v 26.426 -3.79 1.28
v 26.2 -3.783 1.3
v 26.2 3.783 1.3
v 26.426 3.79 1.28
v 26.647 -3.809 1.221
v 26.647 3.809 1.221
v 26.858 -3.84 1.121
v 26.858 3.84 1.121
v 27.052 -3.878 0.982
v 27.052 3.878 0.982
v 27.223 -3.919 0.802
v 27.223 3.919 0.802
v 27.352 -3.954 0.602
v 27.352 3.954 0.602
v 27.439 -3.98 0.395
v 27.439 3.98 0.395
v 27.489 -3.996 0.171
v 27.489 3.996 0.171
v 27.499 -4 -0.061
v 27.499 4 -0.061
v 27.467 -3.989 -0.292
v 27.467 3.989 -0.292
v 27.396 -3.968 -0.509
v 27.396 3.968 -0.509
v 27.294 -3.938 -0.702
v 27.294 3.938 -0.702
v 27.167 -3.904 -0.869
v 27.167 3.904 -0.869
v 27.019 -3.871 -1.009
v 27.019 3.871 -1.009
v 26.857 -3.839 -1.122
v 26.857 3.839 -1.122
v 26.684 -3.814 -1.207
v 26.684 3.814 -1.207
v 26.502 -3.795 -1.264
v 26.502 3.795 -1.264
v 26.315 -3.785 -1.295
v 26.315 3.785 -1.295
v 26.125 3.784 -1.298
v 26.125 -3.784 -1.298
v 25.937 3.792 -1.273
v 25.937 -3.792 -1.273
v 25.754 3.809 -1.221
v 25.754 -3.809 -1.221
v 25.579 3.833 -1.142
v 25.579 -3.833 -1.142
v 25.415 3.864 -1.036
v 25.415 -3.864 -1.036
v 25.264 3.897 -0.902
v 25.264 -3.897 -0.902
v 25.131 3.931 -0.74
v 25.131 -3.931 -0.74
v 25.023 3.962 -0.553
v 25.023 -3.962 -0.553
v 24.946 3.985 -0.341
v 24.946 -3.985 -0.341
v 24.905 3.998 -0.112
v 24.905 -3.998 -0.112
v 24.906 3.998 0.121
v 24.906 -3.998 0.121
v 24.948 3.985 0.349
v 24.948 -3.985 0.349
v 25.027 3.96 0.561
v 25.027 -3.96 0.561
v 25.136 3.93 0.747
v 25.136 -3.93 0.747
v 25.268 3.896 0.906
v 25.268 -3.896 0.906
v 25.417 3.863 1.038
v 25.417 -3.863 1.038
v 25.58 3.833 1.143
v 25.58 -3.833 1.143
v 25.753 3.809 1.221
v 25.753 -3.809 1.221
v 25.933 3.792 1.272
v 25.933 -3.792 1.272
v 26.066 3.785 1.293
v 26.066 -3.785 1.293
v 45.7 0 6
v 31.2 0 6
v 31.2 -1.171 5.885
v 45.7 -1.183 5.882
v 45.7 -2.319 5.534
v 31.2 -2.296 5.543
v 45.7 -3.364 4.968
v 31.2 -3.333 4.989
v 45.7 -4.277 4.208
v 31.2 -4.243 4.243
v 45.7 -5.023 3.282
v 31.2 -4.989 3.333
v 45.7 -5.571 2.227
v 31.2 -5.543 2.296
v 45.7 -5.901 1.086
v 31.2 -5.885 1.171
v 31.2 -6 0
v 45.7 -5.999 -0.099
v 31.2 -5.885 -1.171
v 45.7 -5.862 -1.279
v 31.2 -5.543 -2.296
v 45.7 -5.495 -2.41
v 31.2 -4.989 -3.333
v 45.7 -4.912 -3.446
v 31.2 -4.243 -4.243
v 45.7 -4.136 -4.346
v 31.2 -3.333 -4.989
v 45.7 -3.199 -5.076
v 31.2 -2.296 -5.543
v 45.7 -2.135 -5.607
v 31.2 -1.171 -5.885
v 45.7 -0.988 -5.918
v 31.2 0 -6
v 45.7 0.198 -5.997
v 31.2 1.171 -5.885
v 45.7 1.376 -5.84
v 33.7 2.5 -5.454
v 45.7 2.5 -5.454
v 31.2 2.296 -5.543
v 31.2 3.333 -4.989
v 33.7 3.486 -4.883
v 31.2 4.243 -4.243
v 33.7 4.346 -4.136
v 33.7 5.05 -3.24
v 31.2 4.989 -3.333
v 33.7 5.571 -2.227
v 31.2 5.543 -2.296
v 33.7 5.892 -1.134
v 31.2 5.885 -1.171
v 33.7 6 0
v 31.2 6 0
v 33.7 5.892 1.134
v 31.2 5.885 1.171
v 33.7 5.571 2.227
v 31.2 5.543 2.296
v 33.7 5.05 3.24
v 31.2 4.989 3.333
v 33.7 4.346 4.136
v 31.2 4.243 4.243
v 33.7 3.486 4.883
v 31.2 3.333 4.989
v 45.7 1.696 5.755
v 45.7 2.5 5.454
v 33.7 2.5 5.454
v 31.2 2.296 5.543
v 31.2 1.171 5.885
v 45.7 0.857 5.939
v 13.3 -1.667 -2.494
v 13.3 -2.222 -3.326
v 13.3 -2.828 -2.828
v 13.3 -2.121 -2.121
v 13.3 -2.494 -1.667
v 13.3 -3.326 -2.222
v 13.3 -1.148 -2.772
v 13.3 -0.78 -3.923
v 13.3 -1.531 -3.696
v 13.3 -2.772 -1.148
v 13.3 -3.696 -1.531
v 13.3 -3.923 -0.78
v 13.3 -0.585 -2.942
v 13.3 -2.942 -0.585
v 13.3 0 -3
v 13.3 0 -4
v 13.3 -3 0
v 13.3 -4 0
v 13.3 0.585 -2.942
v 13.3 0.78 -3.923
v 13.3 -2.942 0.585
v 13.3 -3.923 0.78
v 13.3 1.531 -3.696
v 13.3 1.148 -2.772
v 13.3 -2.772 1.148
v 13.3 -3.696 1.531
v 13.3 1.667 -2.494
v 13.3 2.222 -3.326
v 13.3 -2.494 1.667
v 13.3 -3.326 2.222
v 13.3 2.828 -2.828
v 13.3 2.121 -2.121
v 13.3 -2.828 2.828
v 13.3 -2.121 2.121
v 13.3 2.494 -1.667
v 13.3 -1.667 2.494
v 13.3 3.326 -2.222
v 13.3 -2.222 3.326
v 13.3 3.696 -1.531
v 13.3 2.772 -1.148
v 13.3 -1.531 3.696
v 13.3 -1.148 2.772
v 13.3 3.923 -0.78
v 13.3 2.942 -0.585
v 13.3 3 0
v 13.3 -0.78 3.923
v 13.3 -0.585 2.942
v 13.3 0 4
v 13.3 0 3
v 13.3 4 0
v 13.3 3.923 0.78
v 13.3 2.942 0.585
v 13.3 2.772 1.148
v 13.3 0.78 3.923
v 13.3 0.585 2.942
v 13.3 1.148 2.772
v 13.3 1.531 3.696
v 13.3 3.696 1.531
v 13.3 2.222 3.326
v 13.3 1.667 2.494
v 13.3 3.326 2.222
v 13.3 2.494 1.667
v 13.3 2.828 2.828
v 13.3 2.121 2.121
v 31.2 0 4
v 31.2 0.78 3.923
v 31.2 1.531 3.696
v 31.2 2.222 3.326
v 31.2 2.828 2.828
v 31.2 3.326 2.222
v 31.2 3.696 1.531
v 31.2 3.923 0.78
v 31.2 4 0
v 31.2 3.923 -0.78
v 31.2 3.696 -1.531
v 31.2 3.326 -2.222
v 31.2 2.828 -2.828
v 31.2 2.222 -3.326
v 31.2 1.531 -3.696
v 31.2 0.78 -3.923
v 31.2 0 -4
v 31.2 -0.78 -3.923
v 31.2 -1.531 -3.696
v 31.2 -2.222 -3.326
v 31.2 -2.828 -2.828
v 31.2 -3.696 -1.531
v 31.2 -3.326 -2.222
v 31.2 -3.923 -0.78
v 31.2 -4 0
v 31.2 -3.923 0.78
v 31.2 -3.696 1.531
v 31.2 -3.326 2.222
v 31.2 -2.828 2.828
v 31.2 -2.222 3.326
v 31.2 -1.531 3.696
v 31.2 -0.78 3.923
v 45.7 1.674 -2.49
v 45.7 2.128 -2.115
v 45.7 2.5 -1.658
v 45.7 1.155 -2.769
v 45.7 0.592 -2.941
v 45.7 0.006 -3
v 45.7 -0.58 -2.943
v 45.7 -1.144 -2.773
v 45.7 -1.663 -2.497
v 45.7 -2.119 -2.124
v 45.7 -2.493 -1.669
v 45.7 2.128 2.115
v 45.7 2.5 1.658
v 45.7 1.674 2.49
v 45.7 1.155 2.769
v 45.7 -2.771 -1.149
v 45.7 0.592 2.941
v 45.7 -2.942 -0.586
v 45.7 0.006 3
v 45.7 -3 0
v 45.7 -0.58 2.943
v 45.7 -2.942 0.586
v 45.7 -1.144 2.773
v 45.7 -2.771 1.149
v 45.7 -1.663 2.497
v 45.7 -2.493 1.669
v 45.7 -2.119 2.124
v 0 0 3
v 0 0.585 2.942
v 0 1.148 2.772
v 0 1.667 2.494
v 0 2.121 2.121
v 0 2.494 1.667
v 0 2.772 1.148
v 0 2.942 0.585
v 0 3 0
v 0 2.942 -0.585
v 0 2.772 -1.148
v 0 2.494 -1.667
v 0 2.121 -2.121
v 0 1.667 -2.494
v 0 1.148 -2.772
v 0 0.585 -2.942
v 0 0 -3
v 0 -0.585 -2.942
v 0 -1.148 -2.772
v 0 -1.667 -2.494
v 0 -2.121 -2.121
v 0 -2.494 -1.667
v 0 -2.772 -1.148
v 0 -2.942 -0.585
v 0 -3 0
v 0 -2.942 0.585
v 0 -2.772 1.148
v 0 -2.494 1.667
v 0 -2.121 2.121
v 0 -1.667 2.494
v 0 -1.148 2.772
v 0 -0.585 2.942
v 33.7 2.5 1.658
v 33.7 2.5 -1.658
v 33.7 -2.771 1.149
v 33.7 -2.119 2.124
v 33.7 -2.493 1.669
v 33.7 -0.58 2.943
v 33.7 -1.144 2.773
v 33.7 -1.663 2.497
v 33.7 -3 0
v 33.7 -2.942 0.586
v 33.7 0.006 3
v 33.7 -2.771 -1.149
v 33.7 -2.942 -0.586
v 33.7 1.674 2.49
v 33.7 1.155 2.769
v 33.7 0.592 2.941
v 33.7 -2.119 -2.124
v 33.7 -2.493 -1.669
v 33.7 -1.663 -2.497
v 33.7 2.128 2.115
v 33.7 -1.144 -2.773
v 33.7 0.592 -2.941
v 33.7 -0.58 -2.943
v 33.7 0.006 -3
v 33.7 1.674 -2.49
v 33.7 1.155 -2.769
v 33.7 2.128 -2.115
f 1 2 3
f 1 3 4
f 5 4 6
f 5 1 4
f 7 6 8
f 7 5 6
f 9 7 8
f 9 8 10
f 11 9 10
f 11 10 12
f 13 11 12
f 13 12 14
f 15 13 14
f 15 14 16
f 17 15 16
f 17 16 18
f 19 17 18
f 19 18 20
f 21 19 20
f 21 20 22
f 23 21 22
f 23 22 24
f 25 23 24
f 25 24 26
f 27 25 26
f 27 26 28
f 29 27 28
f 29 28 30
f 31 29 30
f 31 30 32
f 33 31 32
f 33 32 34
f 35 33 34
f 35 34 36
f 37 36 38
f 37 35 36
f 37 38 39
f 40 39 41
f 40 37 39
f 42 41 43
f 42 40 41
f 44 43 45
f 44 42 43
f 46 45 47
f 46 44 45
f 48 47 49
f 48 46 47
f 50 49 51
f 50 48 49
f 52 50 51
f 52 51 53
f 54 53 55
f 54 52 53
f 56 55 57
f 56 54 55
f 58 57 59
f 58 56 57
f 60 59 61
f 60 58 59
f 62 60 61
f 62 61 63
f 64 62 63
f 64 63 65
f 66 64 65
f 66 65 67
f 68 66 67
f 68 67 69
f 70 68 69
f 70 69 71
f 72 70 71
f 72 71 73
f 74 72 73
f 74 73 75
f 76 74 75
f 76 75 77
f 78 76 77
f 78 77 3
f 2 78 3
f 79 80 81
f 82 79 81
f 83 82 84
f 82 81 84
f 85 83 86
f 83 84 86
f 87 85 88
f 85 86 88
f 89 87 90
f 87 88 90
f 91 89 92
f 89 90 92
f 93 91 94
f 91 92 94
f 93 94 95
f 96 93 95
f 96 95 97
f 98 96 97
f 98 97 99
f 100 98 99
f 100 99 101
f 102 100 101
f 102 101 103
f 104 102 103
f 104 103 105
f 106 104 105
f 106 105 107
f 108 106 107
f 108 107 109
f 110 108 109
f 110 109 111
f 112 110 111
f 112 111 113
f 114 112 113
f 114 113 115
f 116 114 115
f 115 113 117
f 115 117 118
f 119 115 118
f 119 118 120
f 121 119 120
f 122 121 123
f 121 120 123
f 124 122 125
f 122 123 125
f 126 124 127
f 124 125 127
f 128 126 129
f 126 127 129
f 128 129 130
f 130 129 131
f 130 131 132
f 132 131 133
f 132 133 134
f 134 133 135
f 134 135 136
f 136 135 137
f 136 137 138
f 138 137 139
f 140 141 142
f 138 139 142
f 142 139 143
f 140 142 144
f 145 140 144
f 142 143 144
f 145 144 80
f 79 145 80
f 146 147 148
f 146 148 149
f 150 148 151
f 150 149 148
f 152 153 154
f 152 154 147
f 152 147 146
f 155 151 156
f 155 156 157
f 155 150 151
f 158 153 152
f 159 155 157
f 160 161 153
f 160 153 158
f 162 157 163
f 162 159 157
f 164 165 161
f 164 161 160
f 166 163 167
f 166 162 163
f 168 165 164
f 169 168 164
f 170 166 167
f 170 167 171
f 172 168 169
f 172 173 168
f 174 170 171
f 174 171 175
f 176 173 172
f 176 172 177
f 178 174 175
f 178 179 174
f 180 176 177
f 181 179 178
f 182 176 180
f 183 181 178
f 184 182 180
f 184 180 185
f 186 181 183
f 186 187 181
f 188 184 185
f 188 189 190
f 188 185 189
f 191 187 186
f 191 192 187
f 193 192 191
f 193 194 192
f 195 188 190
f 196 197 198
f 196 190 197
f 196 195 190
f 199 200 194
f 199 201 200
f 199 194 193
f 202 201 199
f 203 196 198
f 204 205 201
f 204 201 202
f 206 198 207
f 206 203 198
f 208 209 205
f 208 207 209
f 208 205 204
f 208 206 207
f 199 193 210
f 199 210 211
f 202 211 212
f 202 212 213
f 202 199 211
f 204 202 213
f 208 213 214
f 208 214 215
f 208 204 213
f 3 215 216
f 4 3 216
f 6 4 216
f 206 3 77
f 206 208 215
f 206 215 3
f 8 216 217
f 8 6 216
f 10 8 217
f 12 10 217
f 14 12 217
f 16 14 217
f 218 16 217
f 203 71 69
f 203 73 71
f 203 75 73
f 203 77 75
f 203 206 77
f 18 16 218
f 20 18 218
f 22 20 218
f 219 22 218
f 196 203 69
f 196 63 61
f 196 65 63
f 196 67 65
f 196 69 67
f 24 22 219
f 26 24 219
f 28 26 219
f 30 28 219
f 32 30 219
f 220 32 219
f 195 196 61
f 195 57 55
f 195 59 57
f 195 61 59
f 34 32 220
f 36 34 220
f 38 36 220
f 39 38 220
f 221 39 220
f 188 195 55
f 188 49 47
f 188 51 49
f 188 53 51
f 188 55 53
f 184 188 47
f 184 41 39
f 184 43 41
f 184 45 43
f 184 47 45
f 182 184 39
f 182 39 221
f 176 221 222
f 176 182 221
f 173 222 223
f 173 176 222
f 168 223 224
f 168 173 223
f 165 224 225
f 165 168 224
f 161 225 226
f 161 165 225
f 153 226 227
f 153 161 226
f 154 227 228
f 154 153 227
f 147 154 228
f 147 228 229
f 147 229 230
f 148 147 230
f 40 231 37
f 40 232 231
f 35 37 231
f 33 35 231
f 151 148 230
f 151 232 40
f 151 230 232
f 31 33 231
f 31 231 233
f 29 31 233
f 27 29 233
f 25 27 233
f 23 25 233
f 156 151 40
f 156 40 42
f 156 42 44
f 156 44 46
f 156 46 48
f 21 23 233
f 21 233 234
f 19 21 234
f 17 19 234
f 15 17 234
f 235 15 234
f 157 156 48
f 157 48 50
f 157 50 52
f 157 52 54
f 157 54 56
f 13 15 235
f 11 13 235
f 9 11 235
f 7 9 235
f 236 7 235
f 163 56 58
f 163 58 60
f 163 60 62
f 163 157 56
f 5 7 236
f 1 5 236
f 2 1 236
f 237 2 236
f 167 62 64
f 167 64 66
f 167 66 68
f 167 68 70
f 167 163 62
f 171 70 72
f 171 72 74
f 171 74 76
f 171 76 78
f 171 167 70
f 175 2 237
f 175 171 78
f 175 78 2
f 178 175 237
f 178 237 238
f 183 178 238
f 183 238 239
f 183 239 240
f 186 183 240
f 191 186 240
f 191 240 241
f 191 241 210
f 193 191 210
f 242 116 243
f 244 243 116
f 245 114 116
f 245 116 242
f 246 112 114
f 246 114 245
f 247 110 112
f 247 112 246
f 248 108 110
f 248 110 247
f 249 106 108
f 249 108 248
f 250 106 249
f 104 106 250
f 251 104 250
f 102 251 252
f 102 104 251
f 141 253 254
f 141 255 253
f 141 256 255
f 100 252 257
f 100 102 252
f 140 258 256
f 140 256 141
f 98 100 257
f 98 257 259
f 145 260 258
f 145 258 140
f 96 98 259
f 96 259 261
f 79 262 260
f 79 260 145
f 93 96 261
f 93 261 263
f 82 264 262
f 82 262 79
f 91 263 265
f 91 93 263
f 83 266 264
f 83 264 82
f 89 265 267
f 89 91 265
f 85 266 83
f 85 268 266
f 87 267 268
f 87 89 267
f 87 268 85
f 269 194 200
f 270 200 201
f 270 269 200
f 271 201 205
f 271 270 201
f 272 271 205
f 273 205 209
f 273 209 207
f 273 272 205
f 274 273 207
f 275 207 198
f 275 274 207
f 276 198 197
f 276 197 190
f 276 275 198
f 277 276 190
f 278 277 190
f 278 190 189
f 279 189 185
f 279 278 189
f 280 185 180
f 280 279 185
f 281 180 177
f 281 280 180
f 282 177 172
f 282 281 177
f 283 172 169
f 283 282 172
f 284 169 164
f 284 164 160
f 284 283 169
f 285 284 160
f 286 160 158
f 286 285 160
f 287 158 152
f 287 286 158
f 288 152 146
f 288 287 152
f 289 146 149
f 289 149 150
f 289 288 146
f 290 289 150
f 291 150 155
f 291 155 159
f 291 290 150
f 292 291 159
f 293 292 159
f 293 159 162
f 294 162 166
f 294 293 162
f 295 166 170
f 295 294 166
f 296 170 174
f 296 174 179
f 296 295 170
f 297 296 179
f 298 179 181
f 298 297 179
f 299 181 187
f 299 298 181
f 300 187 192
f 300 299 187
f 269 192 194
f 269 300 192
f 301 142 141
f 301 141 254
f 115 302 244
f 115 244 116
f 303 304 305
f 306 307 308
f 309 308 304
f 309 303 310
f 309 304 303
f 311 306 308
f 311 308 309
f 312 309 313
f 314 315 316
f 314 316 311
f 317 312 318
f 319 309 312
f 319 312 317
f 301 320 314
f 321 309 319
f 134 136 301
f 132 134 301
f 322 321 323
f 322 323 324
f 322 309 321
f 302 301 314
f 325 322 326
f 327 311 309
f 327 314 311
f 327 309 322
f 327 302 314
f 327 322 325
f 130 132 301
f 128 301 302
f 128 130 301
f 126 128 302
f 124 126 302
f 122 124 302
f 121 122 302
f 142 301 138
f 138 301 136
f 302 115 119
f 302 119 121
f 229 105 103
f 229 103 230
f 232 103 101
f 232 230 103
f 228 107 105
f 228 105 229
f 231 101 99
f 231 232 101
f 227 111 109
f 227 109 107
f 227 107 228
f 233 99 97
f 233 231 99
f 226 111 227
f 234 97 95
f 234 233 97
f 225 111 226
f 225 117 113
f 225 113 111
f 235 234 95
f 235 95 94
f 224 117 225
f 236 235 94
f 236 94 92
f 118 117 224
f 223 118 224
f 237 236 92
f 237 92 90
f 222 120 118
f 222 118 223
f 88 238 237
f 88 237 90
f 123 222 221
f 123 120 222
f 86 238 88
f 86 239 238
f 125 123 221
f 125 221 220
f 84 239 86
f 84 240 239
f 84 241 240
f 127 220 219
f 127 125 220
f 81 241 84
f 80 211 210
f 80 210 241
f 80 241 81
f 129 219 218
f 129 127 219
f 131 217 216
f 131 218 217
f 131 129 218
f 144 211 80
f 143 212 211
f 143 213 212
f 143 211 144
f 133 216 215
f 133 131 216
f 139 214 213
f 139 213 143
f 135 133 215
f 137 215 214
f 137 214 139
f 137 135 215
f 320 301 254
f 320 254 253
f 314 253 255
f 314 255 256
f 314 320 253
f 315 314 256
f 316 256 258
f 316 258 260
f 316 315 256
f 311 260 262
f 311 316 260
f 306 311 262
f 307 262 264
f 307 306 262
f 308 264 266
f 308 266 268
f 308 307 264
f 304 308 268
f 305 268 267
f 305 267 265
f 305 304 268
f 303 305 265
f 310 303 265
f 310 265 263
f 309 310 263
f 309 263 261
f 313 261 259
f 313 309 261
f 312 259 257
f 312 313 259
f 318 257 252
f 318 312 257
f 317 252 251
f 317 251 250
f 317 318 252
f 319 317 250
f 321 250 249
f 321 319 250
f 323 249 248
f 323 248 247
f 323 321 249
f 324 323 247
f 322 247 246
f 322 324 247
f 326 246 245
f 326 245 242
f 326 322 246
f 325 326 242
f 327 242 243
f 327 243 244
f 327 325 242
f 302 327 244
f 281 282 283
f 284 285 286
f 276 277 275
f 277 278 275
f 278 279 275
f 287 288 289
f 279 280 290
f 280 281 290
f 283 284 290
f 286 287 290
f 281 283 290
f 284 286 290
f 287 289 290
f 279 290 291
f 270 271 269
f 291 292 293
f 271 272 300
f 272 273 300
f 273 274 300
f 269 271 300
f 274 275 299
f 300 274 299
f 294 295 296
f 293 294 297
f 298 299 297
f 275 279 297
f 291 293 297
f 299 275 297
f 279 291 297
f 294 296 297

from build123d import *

# Parameters (mm, degrees)
SKETCH_1_R               = 6
EXTRUDE_1_DEPTH          = 45.7
CUT_EXTRUDE_START        = -12
CUT_EXTRUDE_1_DEPTH      = 12
SKETCH_3_OUTSIDE_W       = 23.75
SKETCH_3_OUTSIDE_H       = 23.75
SKETCH_3_OUTSIDE_R       = 4
CUT_EXTRUDE_2_DEPTH      = 31.2
SKETCH_4_OUTSIDE_W       = 23.75
SKETCH_4_OUTSIDE_H       = 23.75
SKETCH_4_OUTSIDE_R       = 3
CUT_EXTRUDE_3_DEPTH      = 13.3
CUT_EXTRUDE_4_DEPTH      = 47.481071416
CUT_EXTRUDE_4_DEPTH_BACK = 47.481071416
SKETCH_5_R               = 1.3


with BuildPart() as part:
    # ｽｹｯﾁ1 → ﾎﾞｽ - 押し出し1 (new body)
    with BuildSketch(Plane(origin=(0, 0, 0), x_dir=(0, 0, -1), z_dir=(1, 0, 0))):
        with Locations(Location((0, 0, 0), (0, 0, 180))):
            Circle(SKETCH_1_R)
    extrude(amount=EXTRUDE_1_DEPTH)

    # ｽｹｯﾁ2 → ｶｯﾄ - 押し出し1 (cut)
    with BuildSketch(Plane(origin=(45.7, 0, 0), x_dir=(0, 0, -1), z_dir=(1, 0, 0)).offset(CUT_EXTRUDE_START)):
        with BuildLine():
            ThreePointArc((5.454356057, 2.5), (0, 6), (-5.454356057, 2.5))
            Line((-5.454356057, 2.5), (-1.658312395, 2.5))
            ThreePointArc((-1.658312395, 2.5), (0, -3), (1.658312395, 2.5))
            Line((1.658312395, 2.5), (5.454356057, 2.5))
        make_face()
    extrude(amount=CUT_EXTRUDE_1_DEPTH, mode=Mode.SUBTRACT)

    # ｽｹｯﾁ3 outside → ｶｯﾄ - 押し出し2 (cut)
    with BuildSketch(Plane.ZY):
        Rectangle(SKETCH_3_OUTSIDE_W, SKETCH_3_OUTSIDE_H)
        Circle(SKETCH_3_OUTSIDE_R, mode=Mode.SUBTRACT)
    extrude(amount=-CUT_EXTRUDE_2_DEPTH, mode=Mode.SUBTRACT)

    # ｽｹｯﾁ4 outside → ｶｯﾄ - 押し出し3 (cut)
    with BuildSketch(Plane.ZY):
        Rectangle(SKETCH_4_OUTSIDE_W, SKETCH_4_OUTSIDE_H)
        Circle(SKETCH_4_OUTSIDE_R, mode=Mode.SUBTRACT)
    extrude(amount=-CUT_EXTRUDE_3_DEPTH, mode=Mode.SUBTRACT)

    # ｽｹｯﾁ5 → ｶｯﾄ - 押し出し4 (cut, two sides: drawn at the far end of the back side and taken through both)
    with BuildSketch(Plane(origin=(0, 0, 0), x_dir=(1, 0, 0), z_dir=(0, 1, 0)).offset(-CUT_EXTRUDE_4_DEPTH_BACK)):
        with Locations(Location((26.2, 0, 0), (0, 0, 270))):
            Circle(SKETCH_5_R)
    extrude(amount=CUT_EXTRUDE_4_DEPTH + CUT_EXTRUDE_4_DEPTH_BACK, mode=Mode.SUBTRACT)


solid = part.part
